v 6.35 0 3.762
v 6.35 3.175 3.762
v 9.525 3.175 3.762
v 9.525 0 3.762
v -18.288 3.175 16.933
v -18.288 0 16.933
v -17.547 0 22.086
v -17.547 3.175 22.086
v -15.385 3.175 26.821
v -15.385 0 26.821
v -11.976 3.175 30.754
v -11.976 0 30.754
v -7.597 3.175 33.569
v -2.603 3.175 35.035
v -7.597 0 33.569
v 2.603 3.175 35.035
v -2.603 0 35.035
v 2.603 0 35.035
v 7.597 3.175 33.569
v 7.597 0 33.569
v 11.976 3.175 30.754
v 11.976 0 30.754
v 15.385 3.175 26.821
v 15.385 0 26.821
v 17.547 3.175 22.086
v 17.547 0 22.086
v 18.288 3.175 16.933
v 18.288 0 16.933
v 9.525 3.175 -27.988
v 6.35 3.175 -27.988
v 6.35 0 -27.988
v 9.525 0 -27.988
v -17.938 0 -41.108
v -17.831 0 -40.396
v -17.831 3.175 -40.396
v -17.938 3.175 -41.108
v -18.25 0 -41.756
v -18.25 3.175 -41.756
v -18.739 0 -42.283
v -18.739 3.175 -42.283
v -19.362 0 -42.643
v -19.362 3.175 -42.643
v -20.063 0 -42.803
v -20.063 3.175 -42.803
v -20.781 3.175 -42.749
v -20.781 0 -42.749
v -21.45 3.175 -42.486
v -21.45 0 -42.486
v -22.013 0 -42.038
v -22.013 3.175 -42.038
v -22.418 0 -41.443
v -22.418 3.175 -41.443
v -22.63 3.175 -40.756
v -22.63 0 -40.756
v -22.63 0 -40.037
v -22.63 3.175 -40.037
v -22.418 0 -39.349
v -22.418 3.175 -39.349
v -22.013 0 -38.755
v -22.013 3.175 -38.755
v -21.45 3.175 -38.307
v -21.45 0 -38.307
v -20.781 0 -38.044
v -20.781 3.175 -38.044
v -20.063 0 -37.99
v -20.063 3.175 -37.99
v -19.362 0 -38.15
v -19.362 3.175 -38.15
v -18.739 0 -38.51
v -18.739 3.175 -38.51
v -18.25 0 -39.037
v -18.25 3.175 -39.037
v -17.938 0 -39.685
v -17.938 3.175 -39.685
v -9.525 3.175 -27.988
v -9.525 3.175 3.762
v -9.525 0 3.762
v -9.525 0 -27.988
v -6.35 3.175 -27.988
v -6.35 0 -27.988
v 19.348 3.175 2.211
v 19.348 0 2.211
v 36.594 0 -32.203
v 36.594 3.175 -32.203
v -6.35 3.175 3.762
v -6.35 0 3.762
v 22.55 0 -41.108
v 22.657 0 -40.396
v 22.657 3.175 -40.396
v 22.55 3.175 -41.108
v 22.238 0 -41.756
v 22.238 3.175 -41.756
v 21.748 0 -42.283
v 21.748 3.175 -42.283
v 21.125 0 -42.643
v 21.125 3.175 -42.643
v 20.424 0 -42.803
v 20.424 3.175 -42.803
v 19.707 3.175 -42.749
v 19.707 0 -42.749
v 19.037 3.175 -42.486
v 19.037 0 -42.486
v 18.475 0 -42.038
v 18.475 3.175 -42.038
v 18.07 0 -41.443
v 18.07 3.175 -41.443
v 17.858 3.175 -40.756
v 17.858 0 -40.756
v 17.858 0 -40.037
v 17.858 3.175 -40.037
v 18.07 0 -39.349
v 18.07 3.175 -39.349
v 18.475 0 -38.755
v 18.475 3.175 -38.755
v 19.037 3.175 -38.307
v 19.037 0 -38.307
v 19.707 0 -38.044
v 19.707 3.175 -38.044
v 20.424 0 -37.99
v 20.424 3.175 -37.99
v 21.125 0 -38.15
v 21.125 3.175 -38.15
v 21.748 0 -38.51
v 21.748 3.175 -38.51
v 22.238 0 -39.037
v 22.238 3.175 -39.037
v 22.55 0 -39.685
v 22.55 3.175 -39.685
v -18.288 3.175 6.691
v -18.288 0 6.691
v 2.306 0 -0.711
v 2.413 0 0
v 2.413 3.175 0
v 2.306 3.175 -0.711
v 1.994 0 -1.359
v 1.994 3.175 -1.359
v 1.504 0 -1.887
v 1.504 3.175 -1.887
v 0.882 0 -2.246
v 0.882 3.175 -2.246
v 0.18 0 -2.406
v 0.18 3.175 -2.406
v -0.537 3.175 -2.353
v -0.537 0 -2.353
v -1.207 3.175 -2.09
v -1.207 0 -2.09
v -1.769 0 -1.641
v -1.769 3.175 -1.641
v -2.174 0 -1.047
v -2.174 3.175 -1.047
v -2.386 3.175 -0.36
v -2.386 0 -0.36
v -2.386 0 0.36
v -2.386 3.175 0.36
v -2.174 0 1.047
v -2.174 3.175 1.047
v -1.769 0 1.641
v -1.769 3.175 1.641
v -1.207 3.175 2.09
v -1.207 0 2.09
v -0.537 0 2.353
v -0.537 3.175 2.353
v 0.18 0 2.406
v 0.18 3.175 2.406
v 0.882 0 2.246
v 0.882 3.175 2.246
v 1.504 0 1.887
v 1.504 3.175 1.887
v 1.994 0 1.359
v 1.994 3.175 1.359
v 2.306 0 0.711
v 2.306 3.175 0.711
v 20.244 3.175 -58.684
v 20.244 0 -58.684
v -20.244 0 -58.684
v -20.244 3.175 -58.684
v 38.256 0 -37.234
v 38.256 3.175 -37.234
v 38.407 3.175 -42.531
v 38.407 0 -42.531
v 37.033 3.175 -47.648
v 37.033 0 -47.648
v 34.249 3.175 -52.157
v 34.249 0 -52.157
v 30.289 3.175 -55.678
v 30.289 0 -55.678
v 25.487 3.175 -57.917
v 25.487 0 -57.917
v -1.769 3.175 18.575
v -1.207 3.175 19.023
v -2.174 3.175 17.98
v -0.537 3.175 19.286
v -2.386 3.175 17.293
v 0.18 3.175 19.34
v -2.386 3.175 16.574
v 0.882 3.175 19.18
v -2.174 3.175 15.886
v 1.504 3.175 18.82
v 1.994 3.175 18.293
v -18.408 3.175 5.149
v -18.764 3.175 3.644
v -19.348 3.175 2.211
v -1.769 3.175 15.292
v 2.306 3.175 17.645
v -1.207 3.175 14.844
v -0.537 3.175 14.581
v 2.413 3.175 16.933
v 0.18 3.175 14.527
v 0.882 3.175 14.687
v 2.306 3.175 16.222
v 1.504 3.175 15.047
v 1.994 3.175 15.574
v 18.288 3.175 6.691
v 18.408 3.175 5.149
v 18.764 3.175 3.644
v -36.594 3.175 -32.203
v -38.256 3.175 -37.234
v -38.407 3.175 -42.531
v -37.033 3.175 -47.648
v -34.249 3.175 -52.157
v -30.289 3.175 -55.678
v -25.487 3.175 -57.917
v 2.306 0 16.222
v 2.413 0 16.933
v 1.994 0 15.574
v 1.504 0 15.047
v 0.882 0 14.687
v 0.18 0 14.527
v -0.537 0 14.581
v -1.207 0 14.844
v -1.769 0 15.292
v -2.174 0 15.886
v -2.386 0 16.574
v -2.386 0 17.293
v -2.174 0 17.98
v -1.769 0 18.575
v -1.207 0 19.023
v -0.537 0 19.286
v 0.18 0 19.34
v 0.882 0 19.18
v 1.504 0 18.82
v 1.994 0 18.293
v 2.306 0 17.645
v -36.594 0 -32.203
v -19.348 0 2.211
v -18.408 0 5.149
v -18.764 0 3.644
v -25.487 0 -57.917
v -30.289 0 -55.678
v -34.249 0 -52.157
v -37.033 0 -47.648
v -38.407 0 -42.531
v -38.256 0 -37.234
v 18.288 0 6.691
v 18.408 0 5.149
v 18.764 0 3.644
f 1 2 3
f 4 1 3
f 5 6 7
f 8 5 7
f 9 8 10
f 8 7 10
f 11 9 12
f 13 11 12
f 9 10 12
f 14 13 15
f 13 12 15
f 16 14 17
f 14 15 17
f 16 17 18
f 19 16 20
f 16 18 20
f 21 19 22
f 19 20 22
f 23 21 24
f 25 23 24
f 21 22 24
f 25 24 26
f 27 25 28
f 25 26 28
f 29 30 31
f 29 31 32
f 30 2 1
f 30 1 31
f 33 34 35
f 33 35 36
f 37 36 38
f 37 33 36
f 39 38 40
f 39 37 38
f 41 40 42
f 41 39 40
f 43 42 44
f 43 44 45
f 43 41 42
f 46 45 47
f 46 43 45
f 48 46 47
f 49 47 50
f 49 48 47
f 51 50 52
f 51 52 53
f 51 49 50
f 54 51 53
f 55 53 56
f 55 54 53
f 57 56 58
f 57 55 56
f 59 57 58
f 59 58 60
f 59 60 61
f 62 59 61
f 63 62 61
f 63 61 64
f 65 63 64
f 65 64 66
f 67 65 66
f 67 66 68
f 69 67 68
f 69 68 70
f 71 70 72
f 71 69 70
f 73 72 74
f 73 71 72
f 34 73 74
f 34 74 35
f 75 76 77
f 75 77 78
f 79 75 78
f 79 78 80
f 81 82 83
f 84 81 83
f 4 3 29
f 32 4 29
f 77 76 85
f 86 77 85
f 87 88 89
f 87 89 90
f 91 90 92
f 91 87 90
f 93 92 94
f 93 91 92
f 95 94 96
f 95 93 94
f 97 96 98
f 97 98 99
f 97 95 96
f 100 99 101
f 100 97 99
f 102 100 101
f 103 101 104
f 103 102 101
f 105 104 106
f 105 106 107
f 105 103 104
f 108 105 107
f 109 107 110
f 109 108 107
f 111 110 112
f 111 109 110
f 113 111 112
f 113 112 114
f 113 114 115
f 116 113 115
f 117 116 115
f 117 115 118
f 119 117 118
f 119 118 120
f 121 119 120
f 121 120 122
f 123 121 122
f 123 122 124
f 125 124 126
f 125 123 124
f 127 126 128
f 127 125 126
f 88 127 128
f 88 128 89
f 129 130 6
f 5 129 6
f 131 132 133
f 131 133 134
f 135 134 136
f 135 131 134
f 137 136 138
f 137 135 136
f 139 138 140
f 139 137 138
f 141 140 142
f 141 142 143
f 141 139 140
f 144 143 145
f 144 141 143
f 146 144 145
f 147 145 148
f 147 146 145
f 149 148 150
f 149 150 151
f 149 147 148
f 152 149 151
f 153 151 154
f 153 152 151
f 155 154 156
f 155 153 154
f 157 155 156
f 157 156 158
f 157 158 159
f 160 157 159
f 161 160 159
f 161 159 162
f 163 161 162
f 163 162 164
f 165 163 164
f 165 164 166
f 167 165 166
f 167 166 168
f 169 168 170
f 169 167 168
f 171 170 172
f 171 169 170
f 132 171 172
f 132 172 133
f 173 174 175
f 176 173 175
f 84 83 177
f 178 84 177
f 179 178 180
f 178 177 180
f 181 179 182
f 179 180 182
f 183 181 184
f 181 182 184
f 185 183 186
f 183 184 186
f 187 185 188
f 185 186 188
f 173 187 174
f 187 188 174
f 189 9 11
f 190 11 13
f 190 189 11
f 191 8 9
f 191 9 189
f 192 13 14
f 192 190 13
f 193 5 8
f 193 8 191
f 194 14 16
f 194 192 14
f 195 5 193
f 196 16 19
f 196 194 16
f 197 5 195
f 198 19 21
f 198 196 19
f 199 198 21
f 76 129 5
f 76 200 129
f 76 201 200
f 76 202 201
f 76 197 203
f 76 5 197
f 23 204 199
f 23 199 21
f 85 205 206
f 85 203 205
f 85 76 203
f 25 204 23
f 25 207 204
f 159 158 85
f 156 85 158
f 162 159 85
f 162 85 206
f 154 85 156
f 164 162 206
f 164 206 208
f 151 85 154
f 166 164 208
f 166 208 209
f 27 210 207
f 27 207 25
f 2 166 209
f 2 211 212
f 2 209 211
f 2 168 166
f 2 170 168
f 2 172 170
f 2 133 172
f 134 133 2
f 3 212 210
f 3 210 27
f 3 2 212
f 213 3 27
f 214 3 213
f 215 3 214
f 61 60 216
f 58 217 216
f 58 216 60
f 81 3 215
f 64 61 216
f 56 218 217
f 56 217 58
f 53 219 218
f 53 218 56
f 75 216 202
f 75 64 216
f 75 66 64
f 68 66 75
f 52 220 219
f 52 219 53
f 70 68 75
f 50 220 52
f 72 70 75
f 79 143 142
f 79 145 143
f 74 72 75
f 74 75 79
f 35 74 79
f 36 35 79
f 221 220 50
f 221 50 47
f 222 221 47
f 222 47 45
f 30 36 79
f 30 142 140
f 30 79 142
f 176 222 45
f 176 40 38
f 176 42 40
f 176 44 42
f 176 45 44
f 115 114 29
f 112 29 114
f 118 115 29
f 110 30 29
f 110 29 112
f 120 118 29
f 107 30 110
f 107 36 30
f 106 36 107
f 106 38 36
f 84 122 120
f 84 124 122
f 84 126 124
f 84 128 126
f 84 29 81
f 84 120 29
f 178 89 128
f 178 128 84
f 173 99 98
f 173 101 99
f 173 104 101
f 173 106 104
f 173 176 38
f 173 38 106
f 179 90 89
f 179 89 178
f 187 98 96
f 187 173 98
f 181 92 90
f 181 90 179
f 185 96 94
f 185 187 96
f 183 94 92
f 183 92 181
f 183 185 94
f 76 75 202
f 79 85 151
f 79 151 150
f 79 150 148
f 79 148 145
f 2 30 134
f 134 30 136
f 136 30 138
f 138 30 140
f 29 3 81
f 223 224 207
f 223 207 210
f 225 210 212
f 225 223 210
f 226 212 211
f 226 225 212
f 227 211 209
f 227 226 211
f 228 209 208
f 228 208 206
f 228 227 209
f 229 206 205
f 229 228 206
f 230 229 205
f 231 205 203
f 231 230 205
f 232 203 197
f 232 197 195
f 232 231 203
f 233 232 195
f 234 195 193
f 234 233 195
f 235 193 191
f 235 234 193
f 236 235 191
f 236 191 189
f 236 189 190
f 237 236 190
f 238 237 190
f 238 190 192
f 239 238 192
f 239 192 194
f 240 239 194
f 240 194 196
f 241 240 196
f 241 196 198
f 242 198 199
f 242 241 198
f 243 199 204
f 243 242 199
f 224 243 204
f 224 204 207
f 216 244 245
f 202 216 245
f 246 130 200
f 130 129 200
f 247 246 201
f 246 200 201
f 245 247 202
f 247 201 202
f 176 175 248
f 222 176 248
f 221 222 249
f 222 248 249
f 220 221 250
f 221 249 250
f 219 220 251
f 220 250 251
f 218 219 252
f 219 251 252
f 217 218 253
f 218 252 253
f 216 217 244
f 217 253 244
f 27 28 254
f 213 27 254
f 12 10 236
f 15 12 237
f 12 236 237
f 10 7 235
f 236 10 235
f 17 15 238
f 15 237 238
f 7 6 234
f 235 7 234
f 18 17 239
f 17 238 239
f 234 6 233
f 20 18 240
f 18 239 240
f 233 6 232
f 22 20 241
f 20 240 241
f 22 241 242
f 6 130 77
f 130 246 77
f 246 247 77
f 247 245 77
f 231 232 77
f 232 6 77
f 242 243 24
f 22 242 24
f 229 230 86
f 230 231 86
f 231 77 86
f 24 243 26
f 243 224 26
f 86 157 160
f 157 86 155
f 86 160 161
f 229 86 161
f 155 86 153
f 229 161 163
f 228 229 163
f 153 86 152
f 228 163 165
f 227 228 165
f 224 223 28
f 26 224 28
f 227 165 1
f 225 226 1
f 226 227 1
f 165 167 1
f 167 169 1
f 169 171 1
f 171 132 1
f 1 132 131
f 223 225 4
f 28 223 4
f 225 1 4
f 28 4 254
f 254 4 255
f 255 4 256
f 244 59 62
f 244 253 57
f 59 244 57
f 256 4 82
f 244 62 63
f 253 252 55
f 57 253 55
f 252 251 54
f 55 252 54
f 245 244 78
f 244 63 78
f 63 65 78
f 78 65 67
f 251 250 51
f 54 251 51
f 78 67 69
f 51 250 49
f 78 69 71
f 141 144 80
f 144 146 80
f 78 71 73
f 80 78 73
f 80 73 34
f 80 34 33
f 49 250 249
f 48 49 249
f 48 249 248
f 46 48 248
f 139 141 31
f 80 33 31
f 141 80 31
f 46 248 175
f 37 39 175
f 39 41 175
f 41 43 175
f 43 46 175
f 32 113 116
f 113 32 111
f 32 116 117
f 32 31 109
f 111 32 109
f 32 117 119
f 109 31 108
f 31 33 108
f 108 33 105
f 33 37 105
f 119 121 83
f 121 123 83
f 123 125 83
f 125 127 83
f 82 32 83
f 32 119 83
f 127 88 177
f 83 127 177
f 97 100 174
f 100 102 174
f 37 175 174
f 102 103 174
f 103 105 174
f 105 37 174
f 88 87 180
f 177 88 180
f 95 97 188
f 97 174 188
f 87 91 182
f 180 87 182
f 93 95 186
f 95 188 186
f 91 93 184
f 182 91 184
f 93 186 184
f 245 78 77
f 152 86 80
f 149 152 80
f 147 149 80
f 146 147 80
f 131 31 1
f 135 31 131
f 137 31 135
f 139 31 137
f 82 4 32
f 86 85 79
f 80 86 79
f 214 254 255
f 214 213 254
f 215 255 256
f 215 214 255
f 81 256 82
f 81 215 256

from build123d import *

# Parameters (mm, degrees)
SKETCH1_R           = 2.413
BOSS_EXTRUDE1_DEPTH = 3.175
FILLET1_R           = 10
CUT_EXTRUDE1_REACH  = 72.275
SKETCH2_W           = 3.175
SKETCH2_H           = 31.75


with BuildPart() as part:
    # Sketch1 → Boss-Extrude1 (new body)
    with BuildSketch(Plane(origin=(0, 0, 0), x_dir=(1, 0, 0), z_dir=(0, 1, 0))):
        with BuildLine():
            Line((20.2438, 58.6843124), (-20.2438, 58.6843124))
            ThreePointArc((-20.2438, 58.6843124), (-35.804843833, 50.003854168), (-36.593688296, 32.202894511))
            Line((-36.593688296, 32.202894511), (-18.288, -4.325934222))
            Line((-18.288, -4.325934222), (-18.288, -16.933333333))
            ThreePointArc((-18.288, -16.933333333), (0, -35.221333333), (18.288, -16.933333333))
            Line((18.288, -16.933333333), (18.288, -4.325934222))
            Line((18.288, -4.325934222), (36.593688296, 32.202894511))
            ThreePointArc((36.593688296, 32.202894511), (35.804843833, 50.003854168), (20.2438, 58.6843124))
        make_face()
        with Locations((-20.2438, 40.3963124)):
            Circle(SKETCH1_R, mode=Mode.SUBTRACT)
        with Locations((20.2438, 40.3963124)):
            Circle(SKETCH1_R, mode=Mode.SUBTRACT)
        Circle(SKETCH1_R, mode=Mode.SUBTRACT)
        with Locations((0, -16.933333333)):
            Circle(SKETCH1_R, mode=Mode.SUBTRACT)
    extrude(amount=BOSS_EXTRUDE1_DEPTH)

    # Fillet1
    fillet1_edges = [part.edges().sort_by_distance(p)[0] for p in [
        (18.288, 1.5875, 4.325934222),
        (-18.288, 1.5875, 4.325934222),
    ]]
    fillet(fillet1_edges, radius=FILLET1_R)

    # Sketch2 → Cut-Extrude1 (cut, up to next)
    with BuildSketch(Plane(origin=(0, 3.175, 0), x_dir=(1, 0, 0), z_dir=(0, 1, 0)), mode=Mode.PRIVATE) as cut_extrude1_sk1:
        with Locations((7.9375, 12.1134886)):
            Rectangle(SKETCH2_W, SKETCH2_H)
    cut_extrude1_tool1 = extrude(cut_extrude1_sk1.sketch, amount=-CUT_EXTRUDE1_REACH, mode=Mode.PRIVATE) & part.part
    # Sketch2 → Cut-Extrude1 (cut, up to next)
    with BuildSketch(Plane(origin=(0, 3.175, 0), x_dir=(1, 0, 0), z_dir=(0, 1, 0)), mode=Mode.PRIVATE) as cut_extrude1_sk2:
        with Locations((-7.9375, 12.1134886)):
            Rectangle(SKETCH2_W, SKETCH2_H)
    cut_extrude1_tool2 = extrude(cut_extrude1_sk2.sketch, amount=-CUT_EXTRUDE1_REACH, mode=Mode.PRIVATE) & part.part
    add(cut_extrude1_tool1.solids().sort_by_distance((7.9375, 3.175, -12.113489))[0], mode=Mode.SUBTRACT)
    add(cut_extrude1_tool2.solids().sort_by_distance((-7.9375, 3.175, -12.113489))[0], mode=Mode.SUBTRACT)


solid = part.part
